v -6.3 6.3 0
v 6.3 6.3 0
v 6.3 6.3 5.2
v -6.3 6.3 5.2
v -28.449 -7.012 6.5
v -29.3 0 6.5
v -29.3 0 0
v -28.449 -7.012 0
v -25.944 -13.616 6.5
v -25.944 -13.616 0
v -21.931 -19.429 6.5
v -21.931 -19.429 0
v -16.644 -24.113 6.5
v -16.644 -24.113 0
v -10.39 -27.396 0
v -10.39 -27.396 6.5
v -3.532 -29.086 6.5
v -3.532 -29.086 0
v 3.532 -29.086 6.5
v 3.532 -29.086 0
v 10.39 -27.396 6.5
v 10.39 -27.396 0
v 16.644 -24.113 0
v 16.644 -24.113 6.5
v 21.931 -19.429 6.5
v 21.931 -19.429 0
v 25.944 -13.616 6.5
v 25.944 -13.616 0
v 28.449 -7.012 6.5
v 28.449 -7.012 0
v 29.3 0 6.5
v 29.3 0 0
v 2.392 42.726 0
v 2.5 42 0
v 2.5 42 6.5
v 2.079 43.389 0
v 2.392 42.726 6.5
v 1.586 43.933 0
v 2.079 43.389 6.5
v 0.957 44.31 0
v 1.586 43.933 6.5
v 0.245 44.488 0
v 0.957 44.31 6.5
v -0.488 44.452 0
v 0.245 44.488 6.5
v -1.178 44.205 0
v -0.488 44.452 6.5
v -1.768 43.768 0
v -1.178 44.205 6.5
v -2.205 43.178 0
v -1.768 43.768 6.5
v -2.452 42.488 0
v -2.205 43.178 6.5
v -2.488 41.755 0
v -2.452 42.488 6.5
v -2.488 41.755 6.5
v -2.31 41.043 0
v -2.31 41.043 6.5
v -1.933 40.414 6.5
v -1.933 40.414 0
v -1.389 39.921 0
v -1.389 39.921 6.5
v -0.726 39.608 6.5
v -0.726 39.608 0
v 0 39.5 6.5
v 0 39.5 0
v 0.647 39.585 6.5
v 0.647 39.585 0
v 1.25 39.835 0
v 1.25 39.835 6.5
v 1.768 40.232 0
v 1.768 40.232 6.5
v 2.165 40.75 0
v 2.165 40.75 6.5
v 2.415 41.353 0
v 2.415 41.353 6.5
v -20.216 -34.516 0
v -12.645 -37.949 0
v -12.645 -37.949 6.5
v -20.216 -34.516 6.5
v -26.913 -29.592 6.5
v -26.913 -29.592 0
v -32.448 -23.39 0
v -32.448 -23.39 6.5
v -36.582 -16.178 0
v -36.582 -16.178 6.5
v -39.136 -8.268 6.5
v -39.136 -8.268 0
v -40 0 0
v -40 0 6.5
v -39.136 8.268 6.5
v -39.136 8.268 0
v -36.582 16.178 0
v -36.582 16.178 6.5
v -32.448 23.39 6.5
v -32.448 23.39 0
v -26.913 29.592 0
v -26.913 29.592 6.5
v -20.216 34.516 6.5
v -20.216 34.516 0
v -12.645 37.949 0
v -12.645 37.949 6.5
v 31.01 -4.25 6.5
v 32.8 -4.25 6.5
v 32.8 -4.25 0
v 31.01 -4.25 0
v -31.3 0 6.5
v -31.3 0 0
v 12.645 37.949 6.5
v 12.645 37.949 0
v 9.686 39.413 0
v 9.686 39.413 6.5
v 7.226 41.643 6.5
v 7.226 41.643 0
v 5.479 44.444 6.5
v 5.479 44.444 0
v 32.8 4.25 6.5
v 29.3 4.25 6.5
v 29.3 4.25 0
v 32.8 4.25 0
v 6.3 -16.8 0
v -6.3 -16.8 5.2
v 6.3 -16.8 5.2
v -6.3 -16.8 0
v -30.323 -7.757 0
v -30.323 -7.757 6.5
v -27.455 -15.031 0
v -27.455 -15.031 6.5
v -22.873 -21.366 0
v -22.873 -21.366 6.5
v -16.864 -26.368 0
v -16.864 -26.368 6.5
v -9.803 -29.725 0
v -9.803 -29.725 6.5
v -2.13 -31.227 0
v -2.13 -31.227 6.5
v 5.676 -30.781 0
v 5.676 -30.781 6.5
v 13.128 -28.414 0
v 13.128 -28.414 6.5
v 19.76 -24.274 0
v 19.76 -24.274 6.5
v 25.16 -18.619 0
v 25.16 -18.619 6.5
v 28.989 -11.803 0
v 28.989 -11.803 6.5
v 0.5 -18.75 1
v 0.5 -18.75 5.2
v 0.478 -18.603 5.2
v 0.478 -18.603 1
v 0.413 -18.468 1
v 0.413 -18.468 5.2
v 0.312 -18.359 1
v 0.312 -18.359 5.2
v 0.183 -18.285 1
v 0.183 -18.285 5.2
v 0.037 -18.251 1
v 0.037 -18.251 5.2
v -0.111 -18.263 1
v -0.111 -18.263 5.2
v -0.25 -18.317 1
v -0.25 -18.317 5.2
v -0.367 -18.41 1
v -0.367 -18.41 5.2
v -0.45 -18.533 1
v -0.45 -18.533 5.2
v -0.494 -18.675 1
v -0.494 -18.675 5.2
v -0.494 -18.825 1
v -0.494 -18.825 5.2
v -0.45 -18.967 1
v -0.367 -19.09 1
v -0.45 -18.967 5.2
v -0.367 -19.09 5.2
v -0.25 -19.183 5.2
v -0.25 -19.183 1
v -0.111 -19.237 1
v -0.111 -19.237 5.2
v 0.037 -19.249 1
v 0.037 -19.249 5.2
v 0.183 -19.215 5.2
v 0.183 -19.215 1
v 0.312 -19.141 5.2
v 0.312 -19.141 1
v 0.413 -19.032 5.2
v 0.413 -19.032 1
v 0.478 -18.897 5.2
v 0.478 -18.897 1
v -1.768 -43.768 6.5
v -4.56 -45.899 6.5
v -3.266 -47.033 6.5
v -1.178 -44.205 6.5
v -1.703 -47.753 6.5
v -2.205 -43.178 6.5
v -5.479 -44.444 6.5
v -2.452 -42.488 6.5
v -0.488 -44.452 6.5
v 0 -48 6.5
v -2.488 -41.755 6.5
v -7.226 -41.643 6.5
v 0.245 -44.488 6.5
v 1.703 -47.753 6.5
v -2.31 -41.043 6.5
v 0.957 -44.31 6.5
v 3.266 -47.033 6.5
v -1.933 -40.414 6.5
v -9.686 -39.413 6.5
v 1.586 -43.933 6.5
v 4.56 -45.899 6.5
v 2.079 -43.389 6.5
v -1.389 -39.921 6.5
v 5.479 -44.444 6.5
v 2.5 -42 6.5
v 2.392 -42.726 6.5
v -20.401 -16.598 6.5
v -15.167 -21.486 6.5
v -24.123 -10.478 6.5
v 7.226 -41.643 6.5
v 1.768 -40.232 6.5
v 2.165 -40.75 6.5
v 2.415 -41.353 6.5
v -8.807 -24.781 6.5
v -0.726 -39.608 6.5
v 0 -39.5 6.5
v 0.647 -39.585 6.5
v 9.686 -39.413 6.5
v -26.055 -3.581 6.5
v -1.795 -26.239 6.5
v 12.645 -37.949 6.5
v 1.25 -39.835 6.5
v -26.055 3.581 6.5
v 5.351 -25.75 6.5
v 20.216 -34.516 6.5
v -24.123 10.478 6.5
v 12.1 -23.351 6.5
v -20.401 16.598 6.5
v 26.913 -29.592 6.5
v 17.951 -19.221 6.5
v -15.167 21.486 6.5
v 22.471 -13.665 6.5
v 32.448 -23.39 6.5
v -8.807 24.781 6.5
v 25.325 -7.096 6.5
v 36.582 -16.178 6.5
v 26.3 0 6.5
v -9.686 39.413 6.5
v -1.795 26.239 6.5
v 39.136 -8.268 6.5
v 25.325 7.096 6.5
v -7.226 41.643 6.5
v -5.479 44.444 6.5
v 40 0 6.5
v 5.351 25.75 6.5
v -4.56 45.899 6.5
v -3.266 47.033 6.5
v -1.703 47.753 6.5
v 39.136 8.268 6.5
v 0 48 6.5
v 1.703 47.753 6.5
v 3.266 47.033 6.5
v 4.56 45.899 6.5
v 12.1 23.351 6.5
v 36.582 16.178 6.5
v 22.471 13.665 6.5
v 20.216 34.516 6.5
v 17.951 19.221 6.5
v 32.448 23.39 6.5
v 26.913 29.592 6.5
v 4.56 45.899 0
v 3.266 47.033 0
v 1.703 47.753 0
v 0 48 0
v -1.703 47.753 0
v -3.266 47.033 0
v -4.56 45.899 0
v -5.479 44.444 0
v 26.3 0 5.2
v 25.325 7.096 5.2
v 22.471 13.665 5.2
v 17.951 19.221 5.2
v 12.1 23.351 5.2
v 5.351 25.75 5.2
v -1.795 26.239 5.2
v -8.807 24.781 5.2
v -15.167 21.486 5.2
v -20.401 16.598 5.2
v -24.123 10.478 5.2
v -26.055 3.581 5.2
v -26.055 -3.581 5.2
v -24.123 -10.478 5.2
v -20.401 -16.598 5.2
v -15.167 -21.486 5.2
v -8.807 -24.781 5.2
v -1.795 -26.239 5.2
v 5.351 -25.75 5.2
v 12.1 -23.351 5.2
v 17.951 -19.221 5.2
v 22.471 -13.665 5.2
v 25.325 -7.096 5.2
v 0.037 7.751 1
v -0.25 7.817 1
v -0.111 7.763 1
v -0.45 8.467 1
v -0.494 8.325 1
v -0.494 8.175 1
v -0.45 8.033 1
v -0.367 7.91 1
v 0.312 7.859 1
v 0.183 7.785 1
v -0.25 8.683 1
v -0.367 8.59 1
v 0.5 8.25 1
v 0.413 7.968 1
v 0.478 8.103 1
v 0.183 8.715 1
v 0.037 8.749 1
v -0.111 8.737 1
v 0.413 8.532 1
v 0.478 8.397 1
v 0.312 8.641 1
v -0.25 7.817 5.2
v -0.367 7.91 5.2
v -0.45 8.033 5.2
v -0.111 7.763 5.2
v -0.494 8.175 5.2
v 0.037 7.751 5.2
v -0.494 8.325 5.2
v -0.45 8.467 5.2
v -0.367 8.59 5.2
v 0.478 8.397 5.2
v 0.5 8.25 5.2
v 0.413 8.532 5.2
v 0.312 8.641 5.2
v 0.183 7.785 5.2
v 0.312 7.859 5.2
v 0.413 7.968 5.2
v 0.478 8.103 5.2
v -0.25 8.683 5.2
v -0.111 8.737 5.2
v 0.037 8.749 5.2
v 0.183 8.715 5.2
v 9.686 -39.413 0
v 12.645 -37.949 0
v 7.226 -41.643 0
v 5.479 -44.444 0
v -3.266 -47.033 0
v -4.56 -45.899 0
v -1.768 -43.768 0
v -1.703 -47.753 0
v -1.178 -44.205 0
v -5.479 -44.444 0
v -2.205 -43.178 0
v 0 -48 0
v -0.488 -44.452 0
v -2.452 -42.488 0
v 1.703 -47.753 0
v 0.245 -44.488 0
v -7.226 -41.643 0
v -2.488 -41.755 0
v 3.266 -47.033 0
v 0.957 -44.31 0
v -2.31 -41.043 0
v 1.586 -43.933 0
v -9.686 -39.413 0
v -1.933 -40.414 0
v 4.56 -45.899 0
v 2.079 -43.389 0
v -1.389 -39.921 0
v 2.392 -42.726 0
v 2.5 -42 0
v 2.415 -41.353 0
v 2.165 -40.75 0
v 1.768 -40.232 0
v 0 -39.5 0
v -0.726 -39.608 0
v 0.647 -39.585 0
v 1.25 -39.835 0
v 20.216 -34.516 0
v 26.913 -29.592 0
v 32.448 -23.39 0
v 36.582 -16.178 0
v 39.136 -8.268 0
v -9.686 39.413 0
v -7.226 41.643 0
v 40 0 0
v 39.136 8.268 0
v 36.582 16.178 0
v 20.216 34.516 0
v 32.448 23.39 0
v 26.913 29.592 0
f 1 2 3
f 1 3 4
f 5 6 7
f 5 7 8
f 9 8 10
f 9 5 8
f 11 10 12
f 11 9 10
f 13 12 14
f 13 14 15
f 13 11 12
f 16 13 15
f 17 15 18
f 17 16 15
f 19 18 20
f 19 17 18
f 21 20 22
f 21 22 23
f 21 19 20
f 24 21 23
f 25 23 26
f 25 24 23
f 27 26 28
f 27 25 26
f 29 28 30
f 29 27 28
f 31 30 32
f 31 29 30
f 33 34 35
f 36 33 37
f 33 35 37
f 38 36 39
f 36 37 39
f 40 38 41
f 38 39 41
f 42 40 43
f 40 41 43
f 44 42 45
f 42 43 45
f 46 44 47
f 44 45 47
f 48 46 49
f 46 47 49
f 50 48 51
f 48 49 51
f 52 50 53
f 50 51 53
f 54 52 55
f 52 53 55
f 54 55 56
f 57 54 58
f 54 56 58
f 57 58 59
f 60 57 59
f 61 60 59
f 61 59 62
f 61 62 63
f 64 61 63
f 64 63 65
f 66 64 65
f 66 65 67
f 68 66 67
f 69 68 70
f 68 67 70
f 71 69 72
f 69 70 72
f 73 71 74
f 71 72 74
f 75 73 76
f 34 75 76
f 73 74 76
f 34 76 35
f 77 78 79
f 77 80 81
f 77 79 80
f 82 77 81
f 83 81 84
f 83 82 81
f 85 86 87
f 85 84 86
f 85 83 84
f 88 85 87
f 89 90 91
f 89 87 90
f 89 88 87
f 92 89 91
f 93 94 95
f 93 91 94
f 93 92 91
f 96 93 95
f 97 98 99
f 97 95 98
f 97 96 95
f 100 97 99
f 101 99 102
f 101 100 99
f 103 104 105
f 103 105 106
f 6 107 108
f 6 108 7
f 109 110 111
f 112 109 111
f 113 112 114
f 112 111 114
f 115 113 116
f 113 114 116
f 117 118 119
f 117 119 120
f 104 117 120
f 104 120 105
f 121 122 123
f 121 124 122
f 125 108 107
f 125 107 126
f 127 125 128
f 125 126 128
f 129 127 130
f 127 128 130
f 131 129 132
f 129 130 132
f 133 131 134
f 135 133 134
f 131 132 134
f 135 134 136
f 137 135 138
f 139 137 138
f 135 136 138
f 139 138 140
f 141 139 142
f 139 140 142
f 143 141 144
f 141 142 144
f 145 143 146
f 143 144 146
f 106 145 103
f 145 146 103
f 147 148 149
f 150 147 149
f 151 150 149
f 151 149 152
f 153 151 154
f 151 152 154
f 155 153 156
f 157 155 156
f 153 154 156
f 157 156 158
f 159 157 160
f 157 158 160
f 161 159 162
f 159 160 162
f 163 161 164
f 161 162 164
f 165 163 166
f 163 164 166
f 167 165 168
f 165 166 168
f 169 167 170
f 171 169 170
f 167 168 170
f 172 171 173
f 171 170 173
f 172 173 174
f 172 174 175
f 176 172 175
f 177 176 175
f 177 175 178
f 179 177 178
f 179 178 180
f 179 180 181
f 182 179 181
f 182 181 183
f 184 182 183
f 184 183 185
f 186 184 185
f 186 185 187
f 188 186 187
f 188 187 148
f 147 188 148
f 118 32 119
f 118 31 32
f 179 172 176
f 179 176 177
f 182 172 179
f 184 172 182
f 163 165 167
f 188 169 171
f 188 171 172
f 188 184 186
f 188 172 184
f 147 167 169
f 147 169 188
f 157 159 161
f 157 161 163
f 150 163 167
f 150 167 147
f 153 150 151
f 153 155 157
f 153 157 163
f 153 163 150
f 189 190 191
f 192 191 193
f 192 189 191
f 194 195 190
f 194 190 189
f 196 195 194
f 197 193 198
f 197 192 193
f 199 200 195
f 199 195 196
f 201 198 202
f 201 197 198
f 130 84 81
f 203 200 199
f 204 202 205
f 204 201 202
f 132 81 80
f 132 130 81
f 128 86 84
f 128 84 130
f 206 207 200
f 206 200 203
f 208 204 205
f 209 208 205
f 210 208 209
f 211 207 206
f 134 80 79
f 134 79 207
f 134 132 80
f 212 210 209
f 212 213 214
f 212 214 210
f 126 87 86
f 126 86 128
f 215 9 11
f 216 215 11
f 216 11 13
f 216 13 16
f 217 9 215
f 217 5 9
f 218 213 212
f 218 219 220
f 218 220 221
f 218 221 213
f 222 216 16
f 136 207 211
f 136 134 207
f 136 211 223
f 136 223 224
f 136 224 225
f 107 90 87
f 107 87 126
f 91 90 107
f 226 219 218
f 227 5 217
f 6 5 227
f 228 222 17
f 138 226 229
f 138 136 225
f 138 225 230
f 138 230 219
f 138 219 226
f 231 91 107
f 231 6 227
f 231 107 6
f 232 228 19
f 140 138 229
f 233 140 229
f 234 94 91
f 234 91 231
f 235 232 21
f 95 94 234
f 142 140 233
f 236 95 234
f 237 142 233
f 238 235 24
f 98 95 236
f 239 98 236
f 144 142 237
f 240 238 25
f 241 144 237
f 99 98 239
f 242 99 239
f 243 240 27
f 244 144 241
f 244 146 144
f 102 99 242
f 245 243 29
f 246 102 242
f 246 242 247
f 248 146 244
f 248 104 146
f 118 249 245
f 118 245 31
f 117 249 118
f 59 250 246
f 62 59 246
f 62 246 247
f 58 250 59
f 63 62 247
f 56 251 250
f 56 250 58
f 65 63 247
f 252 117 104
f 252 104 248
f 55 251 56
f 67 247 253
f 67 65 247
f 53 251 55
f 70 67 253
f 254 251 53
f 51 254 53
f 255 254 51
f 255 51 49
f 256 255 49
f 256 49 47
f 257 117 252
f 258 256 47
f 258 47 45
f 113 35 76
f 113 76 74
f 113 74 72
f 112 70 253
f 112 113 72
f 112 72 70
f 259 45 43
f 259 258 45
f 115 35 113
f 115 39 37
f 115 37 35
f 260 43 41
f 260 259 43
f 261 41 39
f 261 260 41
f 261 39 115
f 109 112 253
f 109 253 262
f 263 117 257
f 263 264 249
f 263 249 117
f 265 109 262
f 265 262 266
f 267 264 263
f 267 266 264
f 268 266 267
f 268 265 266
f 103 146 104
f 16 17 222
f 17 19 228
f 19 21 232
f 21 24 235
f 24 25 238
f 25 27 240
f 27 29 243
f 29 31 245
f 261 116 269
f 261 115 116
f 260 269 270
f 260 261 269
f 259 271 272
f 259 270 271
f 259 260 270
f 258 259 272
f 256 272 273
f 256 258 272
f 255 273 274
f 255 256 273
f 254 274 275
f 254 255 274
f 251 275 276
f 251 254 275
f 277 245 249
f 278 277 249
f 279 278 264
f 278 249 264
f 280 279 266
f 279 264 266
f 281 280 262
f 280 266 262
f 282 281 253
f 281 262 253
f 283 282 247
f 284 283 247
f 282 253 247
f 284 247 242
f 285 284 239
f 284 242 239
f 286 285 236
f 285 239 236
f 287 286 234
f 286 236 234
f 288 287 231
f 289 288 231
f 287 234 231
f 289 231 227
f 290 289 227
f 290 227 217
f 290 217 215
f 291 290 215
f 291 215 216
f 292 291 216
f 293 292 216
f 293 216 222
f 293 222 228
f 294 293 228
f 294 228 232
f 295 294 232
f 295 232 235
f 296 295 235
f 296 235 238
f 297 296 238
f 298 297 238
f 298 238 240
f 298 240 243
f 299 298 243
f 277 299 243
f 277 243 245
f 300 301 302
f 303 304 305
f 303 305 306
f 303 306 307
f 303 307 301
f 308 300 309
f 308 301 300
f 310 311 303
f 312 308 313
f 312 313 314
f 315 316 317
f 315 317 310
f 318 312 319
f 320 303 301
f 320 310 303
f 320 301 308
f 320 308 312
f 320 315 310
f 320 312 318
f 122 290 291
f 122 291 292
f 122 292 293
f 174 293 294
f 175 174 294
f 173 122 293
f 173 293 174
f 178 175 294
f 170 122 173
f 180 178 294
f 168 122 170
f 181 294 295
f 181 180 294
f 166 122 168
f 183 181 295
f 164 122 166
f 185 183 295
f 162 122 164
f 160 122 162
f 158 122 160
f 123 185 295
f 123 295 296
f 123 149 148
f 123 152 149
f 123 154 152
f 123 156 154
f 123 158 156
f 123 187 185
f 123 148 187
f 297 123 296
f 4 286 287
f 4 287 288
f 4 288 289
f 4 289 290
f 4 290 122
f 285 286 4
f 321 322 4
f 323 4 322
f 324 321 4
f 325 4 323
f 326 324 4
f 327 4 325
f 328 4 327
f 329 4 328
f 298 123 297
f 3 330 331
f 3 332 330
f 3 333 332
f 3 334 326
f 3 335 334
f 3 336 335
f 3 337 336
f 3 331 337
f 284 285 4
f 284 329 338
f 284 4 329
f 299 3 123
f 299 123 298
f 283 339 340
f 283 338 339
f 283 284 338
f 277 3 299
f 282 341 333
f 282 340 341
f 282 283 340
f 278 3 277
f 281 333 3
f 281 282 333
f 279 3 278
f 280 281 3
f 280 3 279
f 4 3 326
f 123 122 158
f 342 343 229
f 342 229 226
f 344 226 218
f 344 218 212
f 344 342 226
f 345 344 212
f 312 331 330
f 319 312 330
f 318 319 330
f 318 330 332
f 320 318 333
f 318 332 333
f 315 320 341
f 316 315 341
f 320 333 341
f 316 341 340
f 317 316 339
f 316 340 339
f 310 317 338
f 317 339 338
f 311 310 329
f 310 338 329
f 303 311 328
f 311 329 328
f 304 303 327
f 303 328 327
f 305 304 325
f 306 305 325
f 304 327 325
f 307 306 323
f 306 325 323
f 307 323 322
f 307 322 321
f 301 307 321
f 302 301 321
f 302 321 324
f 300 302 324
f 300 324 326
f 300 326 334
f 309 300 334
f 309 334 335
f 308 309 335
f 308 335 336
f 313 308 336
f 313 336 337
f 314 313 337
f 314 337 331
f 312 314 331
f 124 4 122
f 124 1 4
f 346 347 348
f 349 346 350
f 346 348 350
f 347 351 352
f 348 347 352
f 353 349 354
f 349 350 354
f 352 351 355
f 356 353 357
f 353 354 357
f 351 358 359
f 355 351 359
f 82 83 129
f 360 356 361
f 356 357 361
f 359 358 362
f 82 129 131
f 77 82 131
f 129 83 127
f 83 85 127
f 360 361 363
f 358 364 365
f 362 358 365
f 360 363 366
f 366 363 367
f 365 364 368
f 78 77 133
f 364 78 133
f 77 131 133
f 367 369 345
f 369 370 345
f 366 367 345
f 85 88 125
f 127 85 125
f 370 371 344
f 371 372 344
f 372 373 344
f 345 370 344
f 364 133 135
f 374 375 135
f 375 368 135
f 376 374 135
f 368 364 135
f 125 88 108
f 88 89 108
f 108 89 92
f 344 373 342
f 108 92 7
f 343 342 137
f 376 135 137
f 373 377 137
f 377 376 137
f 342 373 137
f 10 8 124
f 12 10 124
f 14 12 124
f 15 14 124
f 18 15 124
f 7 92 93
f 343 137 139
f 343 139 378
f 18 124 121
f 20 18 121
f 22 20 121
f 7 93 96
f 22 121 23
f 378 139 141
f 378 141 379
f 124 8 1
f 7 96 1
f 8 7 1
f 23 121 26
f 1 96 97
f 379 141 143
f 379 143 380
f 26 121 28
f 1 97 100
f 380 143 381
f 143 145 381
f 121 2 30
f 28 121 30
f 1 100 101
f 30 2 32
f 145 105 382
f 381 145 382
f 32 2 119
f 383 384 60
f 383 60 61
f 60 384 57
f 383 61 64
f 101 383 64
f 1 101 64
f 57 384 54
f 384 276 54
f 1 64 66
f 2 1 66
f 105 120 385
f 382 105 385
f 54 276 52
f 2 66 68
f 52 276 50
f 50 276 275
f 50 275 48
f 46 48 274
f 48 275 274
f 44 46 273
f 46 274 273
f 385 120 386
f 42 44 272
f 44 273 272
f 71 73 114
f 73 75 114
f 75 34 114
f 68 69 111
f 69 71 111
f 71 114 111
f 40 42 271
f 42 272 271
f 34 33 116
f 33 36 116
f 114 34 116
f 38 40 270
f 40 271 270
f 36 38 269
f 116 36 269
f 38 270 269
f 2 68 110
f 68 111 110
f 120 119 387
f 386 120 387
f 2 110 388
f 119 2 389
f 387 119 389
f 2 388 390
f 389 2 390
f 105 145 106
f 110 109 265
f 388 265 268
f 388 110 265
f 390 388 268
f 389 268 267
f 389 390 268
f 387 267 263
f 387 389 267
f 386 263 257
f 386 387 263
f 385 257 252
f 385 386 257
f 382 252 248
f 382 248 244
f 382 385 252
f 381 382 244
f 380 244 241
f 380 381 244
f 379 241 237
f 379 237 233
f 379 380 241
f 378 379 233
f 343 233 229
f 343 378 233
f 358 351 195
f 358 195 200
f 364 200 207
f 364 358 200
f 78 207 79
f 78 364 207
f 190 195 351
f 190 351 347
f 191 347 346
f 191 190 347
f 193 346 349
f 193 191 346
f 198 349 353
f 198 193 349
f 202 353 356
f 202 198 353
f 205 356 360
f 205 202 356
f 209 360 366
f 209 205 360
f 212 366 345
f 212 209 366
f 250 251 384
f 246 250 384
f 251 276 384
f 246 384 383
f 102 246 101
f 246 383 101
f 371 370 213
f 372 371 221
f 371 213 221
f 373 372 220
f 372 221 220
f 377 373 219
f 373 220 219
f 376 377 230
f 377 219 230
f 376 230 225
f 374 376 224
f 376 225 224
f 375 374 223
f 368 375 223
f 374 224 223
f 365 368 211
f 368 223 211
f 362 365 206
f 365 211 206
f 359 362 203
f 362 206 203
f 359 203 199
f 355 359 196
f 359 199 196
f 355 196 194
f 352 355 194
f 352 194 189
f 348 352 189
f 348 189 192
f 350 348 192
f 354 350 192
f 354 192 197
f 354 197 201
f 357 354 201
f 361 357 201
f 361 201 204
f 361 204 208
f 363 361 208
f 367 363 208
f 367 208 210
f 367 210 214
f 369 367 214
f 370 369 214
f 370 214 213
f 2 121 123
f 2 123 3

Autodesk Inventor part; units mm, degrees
ref_plane "YZ Plane" through (0, 0, 0) normal (1, 0, 0) x (0, 1, 0)
ref_plane "XZ Plane" through (0, 0, 0) normal (0, 1, 0) x (-1, 0, 0)
ref_plane "XY Plane" through (0, 0, 0) normal (0, 0, 1) x (1, 0, 0)
sketch "Sketch2" plane through (0, 0, 0) normal (0, 0, 1) x (1, 0, 0)
  line L0 (0, 0) -> (0, 6)
  line L1 (0, 6) -> (-6, 6)
  line L2 (-6, 6) -> (6, 6)
  line L3 (6, 6) -> (6, -16.5)
  line L4 (6, -16.5) -> (-6, -16.5)
  line L5 (-6, -16.5) -> (-6, 6)
  circle A0 centre (0, 0) radius 40
  line L6 (6.3, 6.3) -> (-6.3, 6.3)
  line L7 (-6.3, 6.3) -> (-6.3, -16.8)
  line L8 (-6.3, -16.8) -> (6.3, -16.8)
  line L9 (6.3, -16.8) -> (6.3, 6.3)
  dimension "d15" = 6
  dimension "d16" = 6
  dimension "d17" = 12
  dimension "d18" = 22.5
  dimension "d19" = 80
  dimension "d20" = 0.3
extrude "Extrusion4" add sketch "Sketch2" along normal blind 6.5 contours A0
sketch "Sketch3" plane through (0, 0, 6.5) normal (0, 0, 1) x (1, 0, 0)
  line L0 (-6.3, 6.3) -> (6.3, 6.3) projected
  line L1 (0, 6.3) -> (0, 8.25)
  circle A0 centre (0, 8.25) radius 0.5
  line L2 (6.3, -16.8) -> (-6.3, -16.8) projected
  line L3 (0, -16.8) -> (0, -18.75)
  circle A1 centre (0, -18.75) radius 0.5
  point P0 (0, 0)
  dimension "d23" = 1.95
  dimension "d24" = 1
  dimension "d25" = 1.95
  dimension "d26" = 1
extrude "Extrusion5" cut sketch "Sketch3" against normal blind 5.5
sketch "Sketch5" plane through (0, 0, 6.5) normal (0, 0, 1) x (1, 0, 0)
  circle A0 centre (0, 0) radius 40 projected
sketch "Sketch6" plane through (0, 0, 6.5) normal (0, 0, 1) x (1, 0, 0)
  line L0 (0, 0) -> (0, -42)
  line L1 (0, -42) -> (0, 42)
  circle A0 centre (0, 42) radius 2.5
  circle A1 centre (0, 42) radius 6
  circle A2 centre (0, -42) radius 2.5
  circle A3 centre (0, -42) radius 6
  dimension "d46" = 42
  dimension "d47" = 84
  dimension "d48" = 5
  dimension "d49" = 12
  dimension "d50" = 5
  dimension "d51" = 12
extrude "Extrusion9" add sketch "Sketch6" against normal blind 6.5 contours A2 | A3 | A0 | A1
extrude "Extrusion10" cut sketch "Sketch6" against normal blind 6.5 contours A2 | A0
fillet "Fillet2" radius 12 4 edges at (5.5074, -39.619, 3.25) (-5.5074, -39.619, 3.25) (5.5074, 39.619, 3.25) (-5.5074, 39.619, 3.25)
sketch "Sketch8" plane through (0, 0, 6.5) normal (0, 0, 1) x (1, 0, 0)
  circle A0 centre (0, 0) radius 26.3
  dimension "d58" = 52.6
extrude "Extrusion11" cut sketch "Sketch8" against normal blind 1.3
sketch "Sketch9" plane through (0, 0, 6.5) normal (0, 0, 1) x (1, 0, 0)
  arc A0 (-29.3, 0) -> (29.3, 0) centre (0, 0) ccw
  arc A1 (-31.3, 0) -> (31.0101, -4.25) centre (0, 0) ccw
  line L0 (29.3, 0) -> (29.3, 4.25)
  line L1 (29.3, 4.25) -> (32.8, 4.25)
  line L2 (32.8, 4.25) -> (32.8, -4.25)
  line L3 (32.8, -4.25) -> (31.0101, -4.25)
  line L4 (-31.3, 0) -> (-29.3, 0)
  dimension "d61" = 29.3
  dimension "d62" = 31.3
  dimension "d63" = 4.25
  dimension "d64" = 3.5
  dimension "d65" = 8.5
extrude "Extrusion12" cut sketch "Sketch9" against normal blind 10
properties part number "Onderste plaat bevestiging axiale lager" material "S235"
